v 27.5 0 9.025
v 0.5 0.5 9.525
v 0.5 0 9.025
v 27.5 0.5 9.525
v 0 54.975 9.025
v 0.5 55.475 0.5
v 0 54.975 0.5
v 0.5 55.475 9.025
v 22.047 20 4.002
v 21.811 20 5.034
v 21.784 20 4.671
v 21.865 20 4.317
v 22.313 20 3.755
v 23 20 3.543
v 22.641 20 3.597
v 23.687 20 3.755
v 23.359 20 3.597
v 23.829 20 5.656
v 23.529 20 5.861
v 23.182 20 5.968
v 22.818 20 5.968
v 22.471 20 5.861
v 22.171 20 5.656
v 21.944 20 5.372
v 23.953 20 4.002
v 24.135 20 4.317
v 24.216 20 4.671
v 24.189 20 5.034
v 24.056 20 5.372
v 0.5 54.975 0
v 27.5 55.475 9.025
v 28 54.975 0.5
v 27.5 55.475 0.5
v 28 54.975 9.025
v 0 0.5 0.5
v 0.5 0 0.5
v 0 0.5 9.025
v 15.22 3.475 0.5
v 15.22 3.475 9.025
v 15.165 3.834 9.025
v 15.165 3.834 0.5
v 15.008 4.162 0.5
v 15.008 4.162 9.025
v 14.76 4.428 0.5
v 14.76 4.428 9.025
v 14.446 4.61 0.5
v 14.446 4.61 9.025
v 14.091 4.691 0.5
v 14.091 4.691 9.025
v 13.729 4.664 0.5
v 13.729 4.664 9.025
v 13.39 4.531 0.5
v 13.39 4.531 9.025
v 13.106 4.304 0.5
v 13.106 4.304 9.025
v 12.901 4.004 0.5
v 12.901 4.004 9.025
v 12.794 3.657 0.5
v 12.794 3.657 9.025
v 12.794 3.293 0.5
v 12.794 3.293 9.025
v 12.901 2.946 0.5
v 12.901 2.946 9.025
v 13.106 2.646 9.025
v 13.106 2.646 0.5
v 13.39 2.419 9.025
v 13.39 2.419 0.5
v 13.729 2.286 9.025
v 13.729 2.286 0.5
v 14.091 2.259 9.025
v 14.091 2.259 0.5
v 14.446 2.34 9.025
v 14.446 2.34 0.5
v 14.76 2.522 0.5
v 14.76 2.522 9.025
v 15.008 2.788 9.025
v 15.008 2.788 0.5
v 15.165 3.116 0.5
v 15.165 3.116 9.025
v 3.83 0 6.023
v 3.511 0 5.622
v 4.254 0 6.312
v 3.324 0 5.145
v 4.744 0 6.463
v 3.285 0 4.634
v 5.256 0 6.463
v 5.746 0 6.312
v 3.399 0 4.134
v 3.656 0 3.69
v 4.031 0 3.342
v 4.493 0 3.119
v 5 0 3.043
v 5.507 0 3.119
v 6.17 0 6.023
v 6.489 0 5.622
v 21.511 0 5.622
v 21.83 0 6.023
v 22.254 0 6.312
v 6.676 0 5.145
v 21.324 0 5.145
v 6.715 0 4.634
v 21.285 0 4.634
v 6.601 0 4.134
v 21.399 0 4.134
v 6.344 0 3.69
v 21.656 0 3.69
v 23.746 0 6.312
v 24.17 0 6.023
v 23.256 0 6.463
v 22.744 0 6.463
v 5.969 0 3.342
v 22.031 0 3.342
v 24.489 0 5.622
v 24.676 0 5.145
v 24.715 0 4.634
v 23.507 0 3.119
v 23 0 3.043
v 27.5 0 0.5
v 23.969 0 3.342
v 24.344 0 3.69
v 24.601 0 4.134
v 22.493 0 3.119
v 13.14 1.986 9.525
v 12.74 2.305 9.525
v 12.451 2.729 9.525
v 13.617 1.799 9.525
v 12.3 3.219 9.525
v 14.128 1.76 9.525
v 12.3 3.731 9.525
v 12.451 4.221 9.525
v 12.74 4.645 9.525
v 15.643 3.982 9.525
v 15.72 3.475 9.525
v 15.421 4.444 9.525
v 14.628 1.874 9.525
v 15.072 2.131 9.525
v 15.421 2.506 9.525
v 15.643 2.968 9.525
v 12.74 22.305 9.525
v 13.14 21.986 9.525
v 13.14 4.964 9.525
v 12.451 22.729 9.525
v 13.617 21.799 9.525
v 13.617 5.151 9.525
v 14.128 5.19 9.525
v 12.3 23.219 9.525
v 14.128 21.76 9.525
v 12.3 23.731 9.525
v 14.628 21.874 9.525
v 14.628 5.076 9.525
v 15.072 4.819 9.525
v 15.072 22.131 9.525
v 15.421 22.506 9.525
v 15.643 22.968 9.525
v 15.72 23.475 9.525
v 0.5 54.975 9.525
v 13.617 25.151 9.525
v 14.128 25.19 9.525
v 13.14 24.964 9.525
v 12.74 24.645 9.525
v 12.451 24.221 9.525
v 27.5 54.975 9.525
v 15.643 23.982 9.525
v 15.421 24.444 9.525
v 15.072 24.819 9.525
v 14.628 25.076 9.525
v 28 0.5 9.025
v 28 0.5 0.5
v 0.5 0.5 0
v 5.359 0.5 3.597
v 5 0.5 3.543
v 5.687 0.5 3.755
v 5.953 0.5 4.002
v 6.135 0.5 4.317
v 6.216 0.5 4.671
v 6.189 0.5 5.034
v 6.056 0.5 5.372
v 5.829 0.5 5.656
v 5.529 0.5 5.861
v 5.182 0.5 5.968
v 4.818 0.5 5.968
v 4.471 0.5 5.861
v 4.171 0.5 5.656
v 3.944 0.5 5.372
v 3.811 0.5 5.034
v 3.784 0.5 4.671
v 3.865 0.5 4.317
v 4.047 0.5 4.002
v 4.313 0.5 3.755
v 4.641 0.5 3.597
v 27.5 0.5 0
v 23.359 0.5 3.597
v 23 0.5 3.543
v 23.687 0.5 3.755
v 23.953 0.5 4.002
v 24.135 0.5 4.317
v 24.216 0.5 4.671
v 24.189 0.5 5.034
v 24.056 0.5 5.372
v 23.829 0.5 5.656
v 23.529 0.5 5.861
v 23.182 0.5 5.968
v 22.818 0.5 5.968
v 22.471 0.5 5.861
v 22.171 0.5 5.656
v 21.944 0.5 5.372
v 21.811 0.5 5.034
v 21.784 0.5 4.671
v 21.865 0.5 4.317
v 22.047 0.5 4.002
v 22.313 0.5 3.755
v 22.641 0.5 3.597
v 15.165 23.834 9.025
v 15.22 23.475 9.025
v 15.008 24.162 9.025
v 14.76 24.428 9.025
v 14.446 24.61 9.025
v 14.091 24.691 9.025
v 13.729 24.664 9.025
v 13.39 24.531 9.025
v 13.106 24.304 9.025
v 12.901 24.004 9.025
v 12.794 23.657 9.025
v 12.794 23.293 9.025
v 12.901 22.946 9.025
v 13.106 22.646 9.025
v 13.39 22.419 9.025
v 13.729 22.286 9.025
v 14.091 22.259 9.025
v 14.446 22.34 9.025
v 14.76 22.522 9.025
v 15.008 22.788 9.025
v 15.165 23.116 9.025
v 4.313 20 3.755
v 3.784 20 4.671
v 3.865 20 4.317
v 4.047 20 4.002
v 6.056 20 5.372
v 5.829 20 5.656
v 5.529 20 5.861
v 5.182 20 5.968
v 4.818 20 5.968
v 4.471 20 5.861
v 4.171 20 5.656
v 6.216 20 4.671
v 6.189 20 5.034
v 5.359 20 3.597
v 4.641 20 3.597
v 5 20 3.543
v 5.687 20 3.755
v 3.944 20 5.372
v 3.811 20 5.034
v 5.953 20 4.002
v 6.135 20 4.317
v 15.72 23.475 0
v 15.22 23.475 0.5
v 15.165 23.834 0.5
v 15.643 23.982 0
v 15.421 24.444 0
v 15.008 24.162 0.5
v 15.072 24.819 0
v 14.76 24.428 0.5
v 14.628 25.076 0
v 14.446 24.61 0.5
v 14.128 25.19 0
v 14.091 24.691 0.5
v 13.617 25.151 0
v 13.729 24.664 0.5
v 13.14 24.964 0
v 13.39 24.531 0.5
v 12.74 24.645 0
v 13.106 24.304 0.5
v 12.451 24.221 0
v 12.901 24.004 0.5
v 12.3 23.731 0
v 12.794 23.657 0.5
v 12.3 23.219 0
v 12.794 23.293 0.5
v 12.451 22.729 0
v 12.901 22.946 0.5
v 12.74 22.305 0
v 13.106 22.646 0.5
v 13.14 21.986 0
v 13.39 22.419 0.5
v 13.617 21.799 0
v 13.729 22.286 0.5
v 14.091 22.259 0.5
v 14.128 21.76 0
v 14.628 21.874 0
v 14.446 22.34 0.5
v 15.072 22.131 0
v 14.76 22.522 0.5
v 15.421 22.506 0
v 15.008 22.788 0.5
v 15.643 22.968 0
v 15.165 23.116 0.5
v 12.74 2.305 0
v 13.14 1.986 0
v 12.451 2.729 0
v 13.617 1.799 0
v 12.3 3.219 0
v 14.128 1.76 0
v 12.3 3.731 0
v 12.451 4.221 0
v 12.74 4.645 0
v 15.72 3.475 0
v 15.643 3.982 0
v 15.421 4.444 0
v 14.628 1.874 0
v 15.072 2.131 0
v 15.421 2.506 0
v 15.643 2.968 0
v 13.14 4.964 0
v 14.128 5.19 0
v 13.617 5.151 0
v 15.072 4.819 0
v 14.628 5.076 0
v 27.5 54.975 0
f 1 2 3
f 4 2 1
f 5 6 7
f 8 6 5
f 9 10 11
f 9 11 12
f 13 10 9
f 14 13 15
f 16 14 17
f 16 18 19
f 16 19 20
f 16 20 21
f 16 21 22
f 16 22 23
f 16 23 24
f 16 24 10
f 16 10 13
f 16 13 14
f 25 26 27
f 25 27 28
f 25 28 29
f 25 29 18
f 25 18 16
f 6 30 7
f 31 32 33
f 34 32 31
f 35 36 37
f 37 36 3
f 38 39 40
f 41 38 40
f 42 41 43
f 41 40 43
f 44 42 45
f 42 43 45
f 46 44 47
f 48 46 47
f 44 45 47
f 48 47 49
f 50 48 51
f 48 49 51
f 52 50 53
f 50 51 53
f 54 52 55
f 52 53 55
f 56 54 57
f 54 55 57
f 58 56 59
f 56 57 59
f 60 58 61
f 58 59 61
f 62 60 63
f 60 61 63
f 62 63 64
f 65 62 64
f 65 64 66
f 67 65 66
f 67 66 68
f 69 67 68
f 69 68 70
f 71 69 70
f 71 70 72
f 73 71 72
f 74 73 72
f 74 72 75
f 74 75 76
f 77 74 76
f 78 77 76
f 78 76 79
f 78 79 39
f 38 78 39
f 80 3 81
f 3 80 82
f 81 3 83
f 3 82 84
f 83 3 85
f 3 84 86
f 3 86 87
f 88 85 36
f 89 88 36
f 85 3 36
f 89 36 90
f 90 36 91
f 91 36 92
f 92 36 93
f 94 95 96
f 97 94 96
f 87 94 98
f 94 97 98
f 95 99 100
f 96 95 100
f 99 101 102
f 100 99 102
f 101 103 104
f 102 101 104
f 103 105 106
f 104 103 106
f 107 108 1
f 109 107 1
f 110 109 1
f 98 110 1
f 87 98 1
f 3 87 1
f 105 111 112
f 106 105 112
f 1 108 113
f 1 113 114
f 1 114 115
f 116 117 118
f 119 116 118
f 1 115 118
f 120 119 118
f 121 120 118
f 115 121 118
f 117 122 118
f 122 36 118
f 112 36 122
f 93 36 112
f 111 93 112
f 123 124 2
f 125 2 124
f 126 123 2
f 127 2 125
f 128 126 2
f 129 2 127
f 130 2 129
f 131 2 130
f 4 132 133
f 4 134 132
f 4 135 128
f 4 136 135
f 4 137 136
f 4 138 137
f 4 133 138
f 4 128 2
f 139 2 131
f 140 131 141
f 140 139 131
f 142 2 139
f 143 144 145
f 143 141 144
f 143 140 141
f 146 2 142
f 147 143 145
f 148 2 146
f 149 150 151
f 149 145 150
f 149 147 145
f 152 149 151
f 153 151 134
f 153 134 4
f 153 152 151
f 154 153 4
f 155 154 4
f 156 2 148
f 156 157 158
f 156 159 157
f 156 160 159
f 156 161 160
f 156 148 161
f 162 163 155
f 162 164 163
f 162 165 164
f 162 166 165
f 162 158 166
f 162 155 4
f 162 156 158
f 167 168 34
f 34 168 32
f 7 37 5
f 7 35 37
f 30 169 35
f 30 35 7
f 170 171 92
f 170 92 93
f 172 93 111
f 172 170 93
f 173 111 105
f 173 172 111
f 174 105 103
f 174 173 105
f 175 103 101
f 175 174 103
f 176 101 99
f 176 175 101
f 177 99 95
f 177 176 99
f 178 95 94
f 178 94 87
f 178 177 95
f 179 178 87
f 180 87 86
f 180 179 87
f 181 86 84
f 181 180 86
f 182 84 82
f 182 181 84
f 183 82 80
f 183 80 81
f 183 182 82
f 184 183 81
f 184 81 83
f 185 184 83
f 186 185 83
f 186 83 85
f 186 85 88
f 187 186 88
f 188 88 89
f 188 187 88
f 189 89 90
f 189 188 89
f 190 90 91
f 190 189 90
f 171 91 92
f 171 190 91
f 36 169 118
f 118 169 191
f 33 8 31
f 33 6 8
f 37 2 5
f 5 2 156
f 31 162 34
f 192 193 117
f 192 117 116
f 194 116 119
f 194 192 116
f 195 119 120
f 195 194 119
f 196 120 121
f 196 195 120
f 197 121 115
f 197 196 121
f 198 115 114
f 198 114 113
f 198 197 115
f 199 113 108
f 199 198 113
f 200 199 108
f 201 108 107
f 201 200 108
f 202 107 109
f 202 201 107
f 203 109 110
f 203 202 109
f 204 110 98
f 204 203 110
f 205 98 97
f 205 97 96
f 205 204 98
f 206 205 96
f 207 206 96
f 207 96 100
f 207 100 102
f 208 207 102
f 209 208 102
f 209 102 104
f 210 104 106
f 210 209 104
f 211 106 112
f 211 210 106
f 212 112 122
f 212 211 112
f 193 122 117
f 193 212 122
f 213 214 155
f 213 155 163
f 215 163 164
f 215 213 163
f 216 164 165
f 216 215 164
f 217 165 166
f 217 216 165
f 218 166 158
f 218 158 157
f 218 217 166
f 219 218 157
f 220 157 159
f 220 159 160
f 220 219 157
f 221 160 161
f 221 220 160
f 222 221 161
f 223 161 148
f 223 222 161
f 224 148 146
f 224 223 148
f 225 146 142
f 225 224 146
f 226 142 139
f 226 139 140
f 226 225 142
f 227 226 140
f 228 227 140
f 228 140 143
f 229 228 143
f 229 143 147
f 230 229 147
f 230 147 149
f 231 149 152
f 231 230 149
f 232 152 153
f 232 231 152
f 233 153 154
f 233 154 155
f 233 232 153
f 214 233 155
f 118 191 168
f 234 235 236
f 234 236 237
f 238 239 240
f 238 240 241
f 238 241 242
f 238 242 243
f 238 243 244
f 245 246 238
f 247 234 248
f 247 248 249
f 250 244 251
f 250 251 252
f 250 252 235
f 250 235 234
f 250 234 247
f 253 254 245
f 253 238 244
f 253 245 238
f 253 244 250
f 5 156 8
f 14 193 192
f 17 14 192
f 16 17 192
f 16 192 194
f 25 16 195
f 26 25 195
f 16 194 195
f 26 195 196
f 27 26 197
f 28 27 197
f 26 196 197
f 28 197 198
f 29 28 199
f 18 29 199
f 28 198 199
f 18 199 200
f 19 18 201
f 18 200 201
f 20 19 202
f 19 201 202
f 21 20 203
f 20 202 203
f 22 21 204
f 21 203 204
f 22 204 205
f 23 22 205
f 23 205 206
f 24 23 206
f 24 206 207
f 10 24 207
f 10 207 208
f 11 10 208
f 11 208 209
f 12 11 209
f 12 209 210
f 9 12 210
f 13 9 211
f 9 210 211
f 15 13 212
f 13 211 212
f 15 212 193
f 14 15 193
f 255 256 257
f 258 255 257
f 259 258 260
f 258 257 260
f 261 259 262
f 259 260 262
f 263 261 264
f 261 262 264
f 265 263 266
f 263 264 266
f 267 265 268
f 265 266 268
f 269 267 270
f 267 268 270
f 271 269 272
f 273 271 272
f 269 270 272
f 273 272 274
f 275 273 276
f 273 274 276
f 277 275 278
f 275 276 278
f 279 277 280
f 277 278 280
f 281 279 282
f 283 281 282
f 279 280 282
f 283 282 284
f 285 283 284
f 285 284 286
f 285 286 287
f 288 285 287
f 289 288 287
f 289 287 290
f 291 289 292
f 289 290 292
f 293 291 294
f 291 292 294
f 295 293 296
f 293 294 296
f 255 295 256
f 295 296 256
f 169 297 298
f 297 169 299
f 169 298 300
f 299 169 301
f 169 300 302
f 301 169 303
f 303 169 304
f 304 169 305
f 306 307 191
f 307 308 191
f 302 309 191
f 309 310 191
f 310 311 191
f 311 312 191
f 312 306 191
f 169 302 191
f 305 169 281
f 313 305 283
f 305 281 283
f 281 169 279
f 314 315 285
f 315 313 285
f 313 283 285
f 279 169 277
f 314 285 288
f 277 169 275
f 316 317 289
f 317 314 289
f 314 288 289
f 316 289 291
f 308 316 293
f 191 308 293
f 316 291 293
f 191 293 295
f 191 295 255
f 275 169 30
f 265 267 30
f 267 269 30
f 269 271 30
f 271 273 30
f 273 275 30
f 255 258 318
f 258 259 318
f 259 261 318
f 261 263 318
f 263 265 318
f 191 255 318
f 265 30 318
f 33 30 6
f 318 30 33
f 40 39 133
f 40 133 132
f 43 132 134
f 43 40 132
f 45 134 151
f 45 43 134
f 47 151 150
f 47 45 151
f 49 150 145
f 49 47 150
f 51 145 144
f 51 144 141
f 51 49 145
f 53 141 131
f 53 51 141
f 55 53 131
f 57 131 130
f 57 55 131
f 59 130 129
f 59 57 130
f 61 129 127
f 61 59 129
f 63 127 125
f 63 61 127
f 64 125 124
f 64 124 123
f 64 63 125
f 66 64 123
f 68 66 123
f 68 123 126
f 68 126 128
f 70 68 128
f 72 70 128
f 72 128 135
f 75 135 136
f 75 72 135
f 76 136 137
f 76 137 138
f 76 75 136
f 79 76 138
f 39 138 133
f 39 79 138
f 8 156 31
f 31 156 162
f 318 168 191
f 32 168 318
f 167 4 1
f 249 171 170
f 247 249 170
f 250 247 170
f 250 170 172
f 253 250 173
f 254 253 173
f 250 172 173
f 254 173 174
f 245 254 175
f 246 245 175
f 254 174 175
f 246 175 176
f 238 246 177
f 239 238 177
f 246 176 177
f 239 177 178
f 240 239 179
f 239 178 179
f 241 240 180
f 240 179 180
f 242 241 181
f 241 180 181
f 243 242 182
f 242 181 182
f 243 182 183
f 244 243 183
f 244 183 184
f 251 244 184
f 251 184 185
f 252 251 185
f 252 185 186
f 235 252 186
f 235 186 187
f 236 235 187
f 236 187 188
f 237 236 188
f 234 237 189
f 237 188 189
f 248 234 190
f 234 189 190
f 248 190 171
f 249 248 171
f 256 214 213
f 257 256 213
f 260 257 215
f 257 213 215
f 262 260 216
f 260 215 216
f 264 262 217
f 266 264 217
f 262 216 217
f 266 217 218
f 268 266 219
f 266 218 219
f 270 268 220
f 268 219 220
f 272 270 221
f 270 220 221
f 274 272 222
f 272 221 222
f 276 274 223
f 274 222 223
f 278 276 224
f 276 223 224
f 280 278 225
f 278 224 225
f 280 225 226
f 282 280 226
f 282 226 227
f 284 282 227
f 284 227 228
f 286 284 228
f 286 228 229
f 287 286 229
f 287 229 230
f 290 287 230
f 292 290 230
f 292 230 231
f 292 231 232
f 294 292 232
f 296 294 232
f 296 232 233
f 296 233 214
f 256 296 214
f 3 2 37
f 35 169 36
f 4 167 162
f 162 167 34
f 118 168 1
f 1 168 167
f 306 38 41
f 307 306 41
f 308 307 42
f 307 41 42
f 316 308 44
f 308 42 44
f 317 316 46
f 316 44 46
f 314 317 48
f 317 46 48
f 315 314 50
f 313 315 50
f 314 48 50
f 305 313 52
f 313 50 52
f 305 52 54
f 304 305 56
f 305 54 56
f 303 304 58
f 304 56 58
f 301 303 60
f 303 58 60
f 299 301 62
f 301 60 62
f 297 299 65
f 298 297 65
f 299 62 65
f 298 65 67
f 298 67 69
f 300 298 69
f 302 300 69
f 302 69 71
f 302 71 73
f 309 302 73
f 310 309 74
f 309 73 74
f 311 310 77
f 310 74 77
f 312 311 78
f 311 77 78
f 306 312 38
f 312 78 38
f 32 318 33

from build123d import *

# Parameters (mm, degrees)
SKETCH1_W           = 28
SKETCH1_H           = 55.475
BOSS_EXTRUDE1_DEPTH = 9.525
SKETCH2_R           = 1.2195
CUT_EXTRUDE1_DEPTH  = 20
SKETCH3_R           = 1.2195
CUT_EXTRUDE2_DEPTH  = 63.866535215
CHAMFER1_SIZE       = 0.5
CHAMFER2_SIZE       = 0.5


with BuildPart() as part:
    # Sketch1 → Boss-Extrude1 (new body)
    with BuildSketch(Plane.XY):
        with Locations((14, 27.7375)):
            Rectangle(SKETCH1_W, SKETCH1_H)
    extrude(amount=BOSS_EXTRUDE1_DEPTH)

    # Sketch2 → Cut-Extrude1 (cut)
    with BuildSketch(Plane.XZ):
        with Locations(Location((5, 4.7625, 0), (0, 0, 270))):
            Circle(SKETCH2_R)
        with Locations(Location((23, 4.7625, 0), (0, 0, 270))):
            Circle(SKETCH2_R)
    extrude(amount=-CUT_EXTRUDE1_DEPTH, mode=Mode.SUBTRACT)

    # Sketch3 → Cut-Extrude2 (cut, through all)
    with BuildSketch(Plane.XY.offset(9.525)):
        with Locations((14, 23.475)):
            Circle(SKETCH3_R)
        with Locations((14, 3.475)):
            Circle(SKETCH3_R)
    extrude(amount=-CUT_EXTRUDE2_DEPTH, mode=Mode.SUBTRACT)

    # Chamfer1
    chamfer1_edges = [part.edges().sort_by_distance(p)[0] for p in [
        (28, 27.7375, 9.525),
        (14, 55.475, 9.525),
        (0, 27.7375, 9.525),
        (14, 55.475, 0),
        (28, 27.7375, 0),
        (14, 0, 0),
        (0, 27.7375, 0),
        (14, 0, 9.525),
        (0, 55.475, 4.7625),
        (28, 55.475, 4.7625),
        (28, 0, 4.7625),
        (0, 0, 4.7625),
    ]]
    chamfer(chamfer1_edges, length=CHAMFER1_SIZE)

    # Chamfer2
    chamfer2_edges = [part.edges().sort_by_distance(p)[0] for p in [
        (5, 0, 5.982),
        (23, 0, 5.982),
        (12.7805, 23.475, 0),
        (12.7805, 23.475, 9.525),
        (12.7805, 3.475, 0),
        (12.7805, 3.475, 9.525),
    ]]
    chamfer(chamfer2_edges, length=CHAMFER2_SIZE)


solid = part.part
